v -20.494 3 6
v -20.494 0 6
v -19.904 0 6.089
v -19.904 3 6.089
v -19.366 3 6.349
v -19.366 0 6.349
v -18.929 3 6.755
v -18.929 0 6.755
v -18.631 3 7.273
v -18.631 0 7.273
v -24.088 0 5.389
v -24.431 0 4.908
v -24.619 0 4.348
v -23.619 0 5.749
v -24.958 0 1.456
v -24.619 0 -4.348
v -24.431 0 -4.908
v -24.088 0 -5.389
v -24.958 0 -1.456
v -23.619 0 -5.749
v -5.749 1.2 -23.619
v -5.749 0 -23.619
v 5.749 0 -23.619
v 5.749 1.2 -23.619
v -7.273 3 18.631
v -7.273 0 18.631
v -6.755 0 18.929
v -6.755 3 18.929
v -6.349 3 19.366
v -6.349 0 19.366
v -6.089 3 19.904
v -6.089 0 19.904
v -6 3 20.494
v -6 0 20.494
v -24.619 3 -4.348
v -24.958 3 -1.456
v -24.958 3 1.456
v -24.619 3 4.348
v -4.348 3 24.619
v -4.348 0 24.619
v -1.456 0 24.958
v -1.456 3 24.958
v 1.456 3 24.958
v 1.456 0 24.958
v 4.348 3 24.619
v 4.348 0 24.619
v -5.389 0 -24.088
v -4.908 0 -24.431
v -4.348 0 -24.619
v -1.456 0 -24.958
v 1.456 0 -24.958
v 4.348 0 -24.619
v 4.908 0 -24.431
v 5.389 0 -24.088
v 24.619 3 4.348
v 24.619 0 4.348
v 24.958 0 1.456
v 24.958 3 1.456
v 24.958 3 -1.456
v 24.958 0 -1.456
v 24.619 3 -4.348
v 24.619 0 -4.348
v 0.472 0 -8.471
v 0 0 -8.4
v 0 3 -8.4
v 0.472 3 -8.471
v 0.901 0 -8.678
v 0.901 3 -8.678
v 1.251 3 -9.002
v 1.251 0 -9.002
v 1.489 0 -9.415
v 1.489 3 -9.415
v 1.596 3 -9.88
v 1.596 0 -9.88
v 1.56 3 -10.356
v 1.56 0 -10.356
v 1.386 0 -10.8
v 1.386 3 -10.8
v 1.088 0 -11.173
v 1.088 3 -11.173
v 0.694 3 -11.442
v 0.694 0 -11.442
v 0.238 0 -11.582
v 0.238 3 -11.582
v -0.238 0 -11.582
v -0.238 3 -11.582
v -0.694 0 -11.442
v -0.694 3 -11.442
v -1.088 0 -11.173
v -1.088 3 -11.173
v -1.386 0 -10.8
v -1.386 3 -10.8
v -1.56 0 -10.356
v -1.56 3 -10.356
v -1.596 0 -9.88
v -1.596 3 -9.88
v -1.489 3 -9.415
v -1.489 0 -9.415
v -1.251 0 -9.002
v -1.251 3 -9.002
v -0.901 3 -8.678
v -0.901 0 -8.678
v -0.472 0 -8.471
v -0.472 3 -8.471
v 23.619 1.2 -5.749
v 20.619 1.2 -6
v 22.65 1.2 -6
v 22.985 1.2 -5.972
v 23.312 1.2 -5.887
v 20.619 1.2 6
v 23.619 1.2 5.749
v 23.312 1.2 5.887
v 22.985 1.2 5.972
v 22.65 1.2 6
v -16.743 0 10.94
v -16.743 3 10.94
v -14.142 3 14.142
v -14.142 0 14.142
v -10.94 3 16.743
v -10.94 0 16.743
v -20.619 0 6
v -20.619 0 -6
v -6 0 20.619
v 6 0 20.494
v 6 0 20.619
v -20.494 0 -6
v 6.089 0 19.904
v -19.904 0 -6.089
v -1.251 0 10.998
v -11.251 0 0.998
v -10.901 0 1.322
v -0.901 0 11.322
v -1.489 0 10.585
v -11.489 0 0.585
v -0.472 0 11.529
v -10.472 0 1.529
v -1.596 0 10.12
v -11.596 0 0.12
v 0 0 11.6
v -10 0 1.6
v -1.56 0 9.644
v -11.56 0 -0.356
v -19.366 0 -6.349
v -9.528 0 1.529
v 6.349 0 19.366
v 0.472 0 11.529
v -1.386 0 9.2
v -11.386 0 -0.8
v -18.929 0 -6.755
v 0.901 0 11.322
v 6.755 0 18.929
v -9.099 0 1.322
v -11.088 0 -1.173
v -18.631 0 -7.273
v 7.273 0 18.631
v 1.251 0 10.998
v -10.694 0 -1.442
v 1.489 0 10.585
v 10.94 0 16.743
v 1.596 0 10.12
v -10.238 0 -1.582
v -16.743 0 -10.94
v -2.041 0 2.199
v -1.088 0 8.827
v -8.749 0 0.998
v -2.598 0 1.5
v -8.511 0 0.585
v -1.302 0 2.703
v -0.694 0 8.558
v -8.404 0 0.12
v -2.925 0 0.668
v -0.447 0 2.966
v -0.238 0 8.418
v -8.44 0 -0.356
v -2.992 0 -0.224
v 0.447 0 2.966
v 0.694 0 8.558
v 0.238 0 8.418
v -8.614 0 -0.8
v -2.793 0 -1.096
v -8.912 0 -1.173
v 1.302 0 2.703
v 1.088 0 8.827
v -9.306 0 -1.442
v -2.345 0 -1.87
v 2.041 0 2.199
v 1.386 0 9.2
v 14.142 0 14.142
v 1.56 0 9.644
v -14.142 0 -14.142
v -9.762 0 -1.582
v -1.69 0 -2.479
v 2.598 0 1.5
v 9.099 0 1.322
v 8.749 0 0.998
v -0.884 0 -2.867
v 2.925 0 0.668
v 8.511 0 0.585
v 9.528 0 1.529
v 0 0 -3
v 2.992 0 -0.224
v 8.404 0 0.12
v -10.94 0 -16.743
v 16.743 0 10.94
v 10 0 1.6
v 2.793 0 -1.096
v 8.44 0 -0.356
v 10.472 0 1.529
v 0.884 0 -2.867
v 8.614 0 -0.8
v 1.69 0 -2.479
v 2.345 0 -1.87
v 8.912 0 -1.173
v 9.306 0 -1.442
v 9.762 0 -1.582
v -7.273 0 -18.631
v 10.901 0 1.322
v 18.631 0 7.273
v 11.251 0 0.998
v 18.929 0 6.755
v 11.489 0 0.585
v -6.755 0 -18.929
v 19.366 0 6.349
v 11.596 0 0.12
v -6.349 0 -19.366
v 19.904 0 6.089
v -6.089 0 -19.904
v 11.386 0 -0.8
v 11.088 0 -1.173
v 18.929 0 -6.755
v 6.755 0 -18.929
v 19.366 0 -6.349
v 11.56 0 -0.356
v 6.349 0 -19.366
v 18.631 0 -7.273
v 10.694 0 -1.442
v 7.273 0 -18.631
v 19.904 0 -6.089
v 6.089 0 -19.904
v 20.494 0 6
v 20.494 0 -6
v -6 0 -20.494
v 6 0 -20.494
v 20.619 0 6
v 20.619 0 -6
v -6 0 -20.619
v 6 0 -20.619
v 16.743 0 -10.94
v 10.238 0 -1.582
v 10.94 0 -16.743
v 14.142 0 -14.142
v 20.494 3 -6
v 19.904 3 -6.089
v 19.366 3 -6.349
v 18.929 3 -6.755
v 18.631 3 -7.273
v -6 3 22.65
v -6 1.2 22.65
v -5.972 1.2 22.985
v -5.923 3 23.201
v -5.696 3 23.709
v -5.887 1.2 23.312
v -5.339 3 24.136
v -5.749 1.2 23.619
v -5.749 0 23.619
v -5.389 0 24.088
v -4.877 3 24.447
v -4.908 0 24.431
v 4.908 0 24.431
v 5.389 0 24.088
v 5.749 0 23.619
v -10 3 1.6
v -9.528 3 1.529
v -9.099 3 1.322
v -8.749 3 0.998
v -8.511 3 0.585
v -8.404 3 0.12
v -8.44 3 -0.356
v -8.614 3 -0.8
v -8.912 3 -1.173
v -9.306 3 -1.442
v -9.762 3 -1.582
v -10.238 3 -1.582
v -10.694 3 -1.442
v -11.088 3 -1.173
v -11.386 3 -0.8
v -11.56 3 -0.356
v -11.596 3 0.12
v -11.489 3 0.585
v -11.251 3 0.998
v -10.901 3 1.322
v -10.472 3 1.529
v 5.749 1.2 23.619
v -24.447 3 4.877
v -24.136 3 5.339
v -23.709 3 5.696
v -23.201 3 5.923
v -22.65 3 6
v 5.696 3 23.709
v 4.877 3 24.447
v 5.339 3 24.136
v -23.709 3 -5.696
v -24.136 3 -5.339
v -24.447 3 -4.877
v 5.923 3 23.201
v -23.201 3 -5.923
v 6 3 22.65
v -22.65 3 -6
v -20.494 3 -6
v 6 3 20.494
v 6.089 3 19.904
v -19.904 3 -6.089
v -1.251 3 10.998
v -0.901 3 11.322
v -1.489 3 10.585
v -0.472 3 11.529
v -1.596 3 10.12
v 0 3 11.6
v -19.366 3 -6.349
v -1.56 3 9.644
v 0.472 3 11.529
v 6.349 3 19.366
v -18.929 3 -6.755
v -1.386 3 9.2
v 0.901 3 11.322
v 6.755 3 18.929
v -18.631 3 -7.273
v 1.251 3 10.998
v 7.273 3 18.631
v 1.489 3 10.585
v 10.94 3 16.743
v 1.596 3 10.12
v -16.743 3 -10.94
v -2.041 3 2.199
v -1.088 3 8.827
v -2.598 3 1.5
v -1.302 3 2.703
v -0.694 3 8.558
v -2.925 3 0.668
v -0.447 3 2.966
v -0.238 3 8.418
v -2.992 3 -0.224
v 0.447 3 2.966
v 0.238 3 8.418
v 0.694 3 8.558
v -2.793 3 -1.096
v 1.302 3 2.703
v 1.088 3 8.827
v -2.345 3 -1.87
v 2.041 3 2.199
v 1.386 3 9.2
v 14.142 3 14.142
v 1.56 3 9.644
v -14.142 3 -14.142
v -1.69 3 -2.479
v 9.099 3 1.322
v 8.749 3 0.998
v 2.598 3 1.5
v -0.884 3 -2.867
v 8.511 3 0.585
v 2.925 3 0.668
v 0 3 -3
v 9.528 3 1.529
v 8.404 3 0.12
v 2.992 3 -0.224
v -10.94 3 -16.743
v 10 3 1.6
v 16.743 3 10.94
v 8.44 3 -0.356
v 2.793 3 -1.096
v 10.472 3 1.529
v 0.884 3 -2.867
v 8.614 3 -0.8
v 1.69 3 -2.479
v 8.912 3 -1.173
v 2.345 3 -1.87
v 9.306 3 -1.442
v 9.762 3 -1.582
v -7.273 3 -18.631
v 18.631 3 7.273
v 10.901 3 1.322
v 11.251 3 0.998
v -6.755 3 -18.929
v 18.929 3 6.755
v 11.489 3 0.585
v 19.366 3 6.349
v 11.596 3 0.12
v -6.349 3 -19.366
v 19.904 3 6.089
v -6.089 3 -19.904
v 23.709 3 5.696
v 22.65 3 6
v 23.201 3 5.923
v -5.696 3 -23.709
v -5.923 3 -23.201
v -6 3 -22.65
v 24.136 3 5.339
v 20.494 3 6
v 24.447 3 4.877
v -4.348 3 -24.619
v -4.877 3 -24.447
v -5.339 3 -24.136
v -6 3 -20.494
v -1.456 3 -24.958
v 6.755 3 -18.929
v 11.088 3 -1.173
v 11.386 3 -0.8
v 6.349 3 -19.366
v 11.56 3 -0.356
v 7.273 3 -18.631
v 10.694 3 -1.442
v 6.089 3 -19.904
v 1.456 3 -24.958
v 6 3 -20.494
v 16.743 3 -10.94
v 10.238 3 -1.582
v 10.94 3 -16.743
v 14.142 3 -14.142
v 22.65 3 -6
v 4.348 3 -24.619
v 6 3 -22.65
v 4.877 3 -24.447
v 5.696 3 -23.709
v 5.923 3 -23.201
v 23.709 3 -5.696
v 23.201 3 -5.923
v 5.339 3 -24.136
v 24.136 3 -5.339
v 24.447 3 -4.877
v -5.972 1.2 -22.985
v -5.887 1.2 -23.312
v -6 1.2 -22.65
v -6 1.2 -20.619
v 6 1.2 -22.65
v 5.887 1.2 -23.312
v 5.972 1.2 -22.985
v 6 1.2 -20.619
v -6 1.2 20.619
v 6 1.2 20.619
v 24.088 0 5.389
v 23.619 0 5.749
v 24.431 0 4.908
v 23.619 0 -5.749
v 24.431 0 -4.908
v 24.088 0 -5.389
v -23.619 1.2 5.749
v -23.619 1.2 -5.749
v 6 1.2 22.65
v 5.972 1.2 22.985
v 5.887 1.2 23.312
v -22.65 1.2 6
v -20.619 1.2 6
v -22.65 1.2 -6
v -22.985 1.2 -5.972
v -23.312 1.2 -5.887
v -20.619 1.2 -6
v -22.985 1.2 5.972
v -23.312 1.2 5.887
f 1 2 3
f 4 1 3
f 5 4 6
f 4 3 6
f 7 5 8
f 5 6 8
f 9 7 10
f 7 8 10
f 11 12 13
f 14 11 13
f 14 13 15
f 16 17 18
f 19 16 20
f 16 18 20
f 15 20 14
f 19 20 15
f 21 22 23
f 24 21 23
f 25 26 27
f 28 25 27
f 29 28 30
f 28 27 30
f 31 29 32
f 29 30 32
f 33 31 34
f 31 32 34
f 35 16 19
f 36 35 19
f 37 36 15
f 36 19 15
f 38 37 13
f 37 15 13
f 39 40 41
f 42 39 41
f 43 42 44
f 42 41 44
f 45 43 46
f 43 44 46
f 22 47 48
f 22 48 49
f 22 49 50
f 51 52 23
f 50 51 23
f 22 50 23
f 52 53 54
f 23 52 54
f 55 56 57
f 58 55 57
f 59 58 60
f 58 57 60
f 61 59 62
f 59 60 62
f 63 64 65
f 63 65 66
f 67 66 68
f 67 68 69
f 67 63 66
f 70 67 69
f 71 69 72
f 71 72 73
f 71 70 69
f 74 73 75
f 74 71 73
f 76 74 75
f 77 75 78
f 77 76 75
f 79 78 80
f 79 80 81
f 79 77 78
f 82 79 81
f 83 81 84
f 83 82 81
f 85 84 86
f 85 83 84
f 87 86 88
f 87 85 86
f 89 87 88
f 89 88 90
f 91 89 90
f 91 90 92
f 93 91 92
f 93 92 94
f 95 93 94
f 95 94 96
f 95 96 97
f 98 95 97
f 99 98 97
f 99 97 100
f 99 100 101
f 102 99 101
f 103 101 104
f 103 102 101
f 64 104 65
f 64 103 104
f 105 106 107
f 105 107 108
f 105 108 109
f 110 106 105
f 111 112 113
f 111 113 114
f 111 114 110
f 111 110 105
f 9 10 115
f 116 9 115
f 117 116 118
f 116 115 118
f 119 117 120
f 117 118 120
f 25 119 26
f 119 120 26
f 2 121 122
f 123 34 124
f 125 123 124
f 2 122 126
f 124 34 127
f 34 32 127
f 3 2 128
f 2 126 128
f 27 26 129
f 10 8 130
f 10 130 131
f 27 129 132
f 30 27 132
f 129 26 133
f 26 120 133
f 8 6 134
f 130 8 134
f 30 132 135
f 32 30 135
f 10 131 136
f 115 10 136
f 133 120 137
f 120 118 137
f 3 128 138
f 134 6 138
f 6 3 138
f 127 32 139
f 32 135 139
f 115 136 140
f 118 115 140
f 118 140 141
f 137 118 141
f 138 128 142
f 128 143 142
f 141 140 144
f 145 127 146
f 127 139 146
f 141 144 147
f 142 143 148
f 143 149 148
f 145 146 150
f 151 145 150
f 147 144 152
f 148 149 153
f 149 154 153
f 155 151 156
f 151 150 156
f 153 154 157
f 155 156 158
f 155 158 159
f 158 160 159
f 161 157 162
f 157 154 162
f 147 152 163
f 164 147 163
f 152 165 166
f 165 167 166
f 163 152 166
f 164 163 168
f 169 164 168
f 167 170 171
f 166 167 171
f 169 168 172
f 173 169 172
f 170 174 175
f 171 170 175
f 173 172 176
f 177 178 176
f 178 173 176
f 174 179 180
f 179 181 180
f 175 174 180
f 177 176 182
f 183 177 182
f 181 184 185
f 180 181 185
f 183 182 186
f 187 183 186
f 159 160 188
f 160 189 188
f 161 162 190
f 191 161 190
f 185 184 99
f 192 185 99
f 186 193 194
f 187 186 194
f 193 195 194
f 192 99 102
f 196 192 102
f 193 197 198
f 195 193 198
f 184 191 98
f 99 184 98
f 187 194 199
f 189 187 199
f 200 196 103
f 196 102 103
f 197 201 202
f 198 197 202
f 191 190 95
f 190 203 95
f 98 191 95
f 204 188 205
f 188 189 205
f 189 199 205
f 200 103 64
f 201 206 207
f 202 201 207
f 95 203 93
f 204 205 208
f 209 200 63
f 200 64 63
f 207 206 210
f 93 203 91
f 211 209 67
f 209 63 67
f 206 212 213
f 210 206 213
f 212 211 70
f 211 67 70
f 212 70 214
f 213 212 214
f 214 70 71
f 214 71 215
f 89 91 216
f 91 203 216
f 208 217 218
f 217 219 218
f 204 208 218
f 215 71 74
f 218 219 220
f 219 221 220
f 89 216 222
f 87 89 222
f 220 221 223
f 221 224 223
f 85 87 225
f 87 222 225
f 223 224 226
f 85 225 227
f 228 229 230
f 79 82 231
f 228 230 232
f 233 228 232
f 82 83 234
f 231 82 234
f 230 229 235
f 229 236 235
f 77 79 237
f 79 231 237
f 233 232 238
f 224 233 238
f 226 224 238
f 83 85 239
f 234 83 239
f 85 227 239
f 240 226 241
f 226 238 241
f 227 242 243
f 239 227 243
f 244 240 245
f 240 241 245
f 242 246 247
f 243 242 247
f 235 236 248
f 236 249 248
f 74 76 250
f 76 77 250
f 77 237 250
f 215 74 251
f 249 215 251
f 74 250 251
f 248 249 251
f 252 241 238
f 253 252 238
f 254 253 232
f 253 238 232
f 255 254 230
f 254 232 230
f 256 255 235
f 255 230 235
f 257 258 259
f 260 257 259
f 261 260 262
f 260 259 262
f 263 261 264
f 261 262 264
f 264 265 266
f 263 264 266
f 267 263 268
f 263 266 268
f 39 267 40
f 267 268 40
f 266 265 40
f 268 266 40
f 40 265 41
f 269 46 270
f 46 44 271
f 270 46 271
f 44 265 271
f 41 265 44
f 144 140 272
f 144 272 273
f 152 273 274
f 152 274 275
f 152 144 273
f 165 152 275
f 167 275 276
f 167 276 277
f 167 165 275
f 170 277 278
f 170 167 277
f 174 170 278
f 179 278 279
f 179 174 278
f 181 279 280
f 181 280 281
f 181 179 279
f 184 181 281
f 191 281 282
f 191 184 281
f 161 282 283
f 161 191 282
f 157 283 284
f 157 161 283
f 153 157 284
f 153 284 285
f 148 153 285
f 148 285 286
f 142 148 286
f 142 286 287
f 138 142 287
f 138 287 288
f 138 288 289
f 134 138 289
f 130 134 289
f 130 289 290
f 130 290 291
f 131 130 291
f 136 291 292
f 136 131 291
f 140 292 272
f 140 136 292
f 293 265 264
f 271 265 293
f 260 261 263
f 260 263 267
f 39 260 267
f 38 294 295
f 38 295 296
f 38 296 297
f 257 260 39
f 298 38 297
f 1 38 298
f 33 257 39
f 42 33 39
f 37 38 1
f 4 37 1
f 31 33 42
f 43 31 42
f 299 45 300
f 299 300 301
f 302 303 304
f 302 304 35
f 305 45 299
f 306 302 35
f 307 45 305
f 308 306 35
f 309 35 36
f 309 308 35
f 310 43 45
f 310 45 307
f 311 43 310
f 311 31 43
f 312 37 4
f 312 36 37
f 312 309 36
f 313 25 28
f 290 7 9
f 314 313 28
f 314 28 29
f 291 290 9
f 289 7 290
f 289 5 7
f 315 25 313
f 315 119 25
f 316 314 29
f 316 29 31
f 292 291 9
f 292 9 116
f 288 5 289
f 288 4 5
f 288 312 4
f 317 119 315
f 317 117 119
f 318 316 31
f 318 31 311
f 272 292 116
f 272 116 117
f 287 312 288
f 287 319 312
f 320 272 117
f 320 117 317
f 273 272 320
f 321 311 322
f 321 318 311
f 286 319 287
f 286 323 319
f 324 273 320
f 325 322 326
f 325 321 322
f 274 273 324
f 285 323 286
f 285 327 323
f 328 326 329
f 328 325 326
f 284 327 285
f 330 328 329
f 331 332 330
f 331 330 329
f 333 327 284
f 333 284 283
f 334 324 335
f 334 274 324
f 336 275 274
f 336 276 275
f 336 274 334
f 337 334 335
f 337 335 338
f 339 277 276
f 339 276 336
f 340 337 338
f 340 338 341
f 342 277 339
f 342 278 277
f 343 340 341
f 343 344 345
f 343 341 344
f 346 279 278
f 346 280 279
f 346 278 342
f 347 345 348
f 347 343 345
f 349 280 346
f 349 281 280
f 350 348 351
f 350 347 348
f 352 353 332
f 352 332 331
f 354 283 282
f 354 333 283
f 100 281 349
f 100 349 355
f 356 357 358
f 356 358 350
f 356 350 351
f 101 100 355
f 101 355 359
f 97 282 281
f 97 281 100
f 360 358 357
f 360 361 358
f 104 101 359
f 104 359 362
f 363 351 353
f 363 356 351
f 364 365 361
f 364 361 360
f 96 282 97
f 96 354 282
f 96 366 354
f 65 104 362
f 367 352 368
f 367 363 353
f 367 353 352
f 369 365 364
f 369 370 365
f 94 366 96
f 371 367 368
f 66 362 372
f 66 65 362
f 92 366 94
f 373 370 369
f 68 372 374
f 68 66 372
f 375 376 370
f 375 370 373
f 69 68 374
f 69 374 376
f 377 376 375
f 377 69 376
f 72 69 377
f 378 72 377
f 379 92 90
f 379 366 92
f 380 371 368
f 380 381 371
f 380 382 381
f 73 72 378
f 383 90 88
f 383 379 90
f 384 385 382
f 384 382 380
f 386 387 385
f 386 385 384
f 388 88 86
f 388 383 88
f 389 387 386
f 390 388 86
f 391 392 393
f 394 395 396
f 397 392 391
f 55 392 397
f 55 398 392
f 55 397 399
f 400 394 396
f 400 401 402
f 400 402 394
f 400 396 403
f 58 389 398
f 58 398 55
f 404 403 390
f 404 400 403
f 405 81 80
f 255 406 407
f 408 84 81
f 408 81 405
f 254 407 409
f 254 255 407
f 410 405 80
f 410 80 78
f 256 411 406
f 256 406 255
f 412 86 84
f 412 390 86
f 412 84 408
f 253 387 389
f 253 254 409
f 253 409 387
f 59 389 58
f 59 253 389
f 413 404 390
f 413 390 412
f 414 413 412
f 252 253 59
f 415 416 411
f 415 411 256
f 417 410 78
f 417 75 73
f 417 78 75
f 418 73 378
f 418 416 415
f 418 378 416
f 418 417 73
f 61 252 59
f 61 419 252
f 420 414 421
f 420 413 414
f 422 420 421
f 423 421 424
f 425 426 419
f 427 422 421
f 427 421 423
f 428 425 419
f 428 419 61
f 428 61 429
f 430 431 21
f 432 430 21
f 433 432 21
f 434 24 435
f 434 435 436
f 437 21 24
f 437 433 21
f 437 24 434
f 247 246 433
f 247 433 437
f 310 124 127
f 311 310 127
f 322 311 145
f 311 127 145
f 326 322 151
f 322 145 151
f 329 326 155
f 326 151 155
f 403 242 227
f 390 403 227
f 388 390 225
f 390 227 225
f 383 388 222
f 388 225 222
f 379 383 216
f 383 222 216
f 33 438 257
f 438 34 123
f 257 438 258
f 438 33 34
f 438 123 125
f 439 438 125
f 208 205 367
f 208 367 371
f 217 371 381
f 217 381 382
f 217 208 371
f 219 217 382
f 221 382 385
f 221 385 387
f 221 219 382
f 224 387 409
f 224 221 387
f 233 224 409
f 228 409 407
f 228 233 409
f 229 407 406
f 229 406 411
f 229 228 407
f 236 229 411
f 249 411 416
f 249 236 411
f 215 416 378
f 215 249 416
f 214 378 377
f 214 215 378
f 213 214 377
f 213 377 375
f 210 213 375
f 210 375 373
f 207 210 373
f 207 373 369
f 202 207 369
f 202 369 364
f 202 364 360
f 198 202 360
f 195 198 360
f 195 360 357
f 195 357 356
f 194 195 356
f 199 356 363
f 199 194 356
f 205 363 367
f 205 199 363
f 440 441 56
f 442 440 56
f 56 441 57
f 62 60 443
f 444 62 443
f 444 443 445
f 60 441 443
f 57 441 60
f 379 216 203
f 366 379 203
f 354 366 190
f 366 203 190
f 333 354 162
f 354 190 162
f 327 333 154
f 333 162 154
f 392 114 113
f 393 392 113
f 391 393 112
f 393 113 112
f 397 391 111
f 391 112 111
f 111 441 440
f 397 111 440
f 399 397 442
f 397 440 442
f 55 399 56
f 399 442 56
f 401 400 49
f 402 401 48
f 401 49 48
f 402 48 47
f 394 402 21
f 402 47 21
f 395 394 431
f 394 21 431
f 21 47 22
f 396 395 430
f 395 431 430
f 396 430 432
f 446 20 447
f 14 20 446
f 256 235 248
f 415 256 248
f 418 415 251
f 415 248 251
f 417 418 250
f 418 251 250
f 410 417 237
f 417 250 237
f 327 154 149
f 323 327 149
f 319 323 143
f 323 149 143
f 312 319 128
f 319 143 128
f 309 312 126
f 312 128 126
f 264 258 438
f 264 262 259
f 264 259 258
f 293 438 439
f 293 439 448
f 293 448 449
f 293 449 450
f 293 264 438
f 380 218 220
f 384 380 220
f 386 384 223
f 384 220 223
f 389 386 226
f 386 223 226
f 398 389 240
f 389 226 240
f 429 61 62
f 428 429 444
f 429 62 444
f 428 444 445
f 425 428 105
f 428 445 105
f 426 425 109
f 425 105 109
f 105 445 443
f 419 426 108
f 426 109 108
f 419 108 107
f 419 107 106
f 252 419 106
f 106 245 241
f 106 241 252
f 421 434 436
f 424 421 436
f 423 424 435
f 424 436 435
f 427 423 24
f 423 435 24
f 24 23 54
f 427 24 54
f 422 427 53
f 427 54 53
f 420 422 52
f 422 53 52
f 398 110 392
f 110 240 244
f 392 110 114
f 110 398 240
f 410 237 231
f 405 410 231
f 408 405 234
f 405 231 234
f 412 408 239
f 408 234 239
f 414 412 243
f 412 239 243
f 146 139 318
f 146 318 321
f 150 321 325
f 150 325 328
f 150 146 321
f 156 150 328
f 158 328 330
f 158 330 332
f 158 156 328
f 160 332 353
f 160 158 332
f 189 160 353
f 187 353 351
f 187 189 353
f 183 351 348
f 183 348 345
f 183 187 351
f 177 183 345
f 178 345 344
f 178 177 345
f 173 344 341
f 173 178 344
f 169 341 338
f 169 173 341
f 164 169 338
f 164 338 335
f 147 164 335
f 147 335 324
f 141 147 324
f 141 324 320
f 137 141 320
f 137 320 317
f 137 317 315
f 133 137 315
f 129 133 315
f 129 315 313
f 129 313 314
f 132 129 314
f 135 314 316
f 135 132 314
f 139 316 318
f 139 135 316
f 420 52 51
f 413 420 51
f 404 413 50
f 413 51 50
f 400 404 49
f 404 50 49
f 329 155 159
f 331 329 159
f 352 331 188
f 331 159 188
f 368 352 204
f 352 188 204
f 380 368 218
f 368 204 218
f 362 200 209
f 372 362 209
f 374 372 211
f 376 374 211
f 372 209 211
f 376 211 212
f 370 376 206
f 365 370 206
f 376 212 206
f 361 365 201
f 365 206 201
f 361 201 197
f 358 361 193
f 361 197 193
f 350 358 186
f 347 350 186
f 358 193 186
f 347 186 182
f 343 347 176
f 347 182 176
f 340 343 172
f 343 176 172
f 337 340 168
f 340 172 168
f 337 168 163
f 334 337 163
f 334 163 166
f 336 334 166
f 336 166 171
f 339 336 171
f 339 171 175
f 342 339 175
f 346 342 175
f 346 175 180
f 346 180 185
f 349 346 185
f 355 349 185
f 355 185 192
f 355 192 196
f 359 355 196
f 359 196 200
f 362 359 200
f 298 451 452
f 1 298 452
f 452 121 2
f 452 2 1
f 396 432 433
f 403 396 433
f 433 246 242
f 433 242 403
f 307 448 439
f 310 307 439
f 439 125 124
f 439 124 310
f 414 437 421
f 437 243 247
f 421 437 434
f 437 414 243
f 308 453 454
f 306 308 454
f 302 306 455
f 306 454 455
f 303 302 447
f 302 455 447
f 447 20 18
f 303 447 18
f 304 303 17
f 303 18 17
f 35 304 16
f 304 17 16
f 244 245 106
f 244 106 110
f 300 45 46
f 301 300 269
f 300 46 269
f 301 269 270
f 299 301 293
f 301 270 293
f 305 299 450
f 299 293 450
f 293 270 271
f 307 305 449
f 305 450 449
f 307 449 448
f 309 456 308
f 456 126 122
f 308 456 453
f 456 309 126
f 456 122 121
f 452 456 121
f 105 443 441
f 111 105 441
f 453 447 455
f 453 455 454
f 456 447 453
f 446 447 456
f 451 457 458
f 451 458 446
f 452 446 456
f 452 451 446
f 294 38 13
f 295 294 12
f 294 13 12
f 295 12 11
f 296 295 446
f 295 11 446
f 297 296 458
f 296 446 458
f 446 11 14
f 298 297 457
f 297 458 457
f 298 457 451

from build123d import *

# Parameters (mm, degrees)
SKIZZE1_R                       = 19
SKIZZE1_R_2                     = 1.6
AUFSATZ_LINEAR_AUSTRAGEN1_DEPTH = 3
SKIZZE6_R                       = 3
SCHNITT_LINEAR_AUSTRAGEN2_DEPTH = 36.482389998
SKIZZE7_W                       = 3
SKIZZE7_H                       = 12
SKIZZE7_W_2                     = 12
SKIZZE7_H_2                     = 3
SCHNITT_LINEAR_AUSTRAGEN3_DEPTH = 1.2


with BuildPart() as part:
    # Skizze1 → Aufsatz-Linear austragen1 (new body)
    with BuildSketch(Plane(origin=(0, 0, 0), x_dir=(1, 0, 0), z_dir=(0, 1, 0))):
        with BuildLine():
            ThreePointArc((6, -20.493901532), (6.348554352, -19.365749382), (7.272727273, -18.630819574))
            ThreePointArc((7.272727273, -18.630819574), (14.142135624, -14.142135624), (18.630819574, -7.272727273))
            ThreePointArc((18.630819574, -7.272727273), (19.365749382, -6.348554352), (20.493901532, -6))
            Line((20.493901532, -6), (22.649503306, -6))
            ThreePointArc((22.649503306, -6), (23.93487248, -5.532261755), (24.619025332, -4.347826087))
            ThreePointArc((24.619025332, -4.347826087), (25, 0), (24.619025332, 4.347826087))
            ThreePointArc((24.619025332, 4.347826087), (23.93487248, 5.532261755), (22.649503306, 6))
            Line((22.649503306, 6), (20.493901532, 6))
            ThreePointArc((20.493901532, 6), (19.365749382, 6.348554352), (18.630819574, 7.272727273))
            ThreePointArc((18.630819574, 7.272727273), (14.142135624, 14.142135624), (7.272727273, 18.630819574))
            ThreePointArc((7.272727273, 18.630819574), (6.348554352, 19.365749382), (6, 20.493901532))
            Line((6, 20.493901532), (6, 22.649503306))
            ThreePointArc((6, 22.649503306), (5.532261755, 23.93487248), (4.347826087, 24.619025332))
            ThreePointArc((4.347826087, 24.619025332), (0, 25), (-4.347826087, 24.619025332))
            ThreePointArc((-4.347826087, 24.619025332), (-5.532261755, 23.93487248), (-6, 22.649503306))
            Line((-6, 22.649503306), (-6, 20.493901532))
            ThreePointArc((-6, 20.493901532), (-6.348554352, 19.365749382), (-7.272727273, 18.630819574))
            ThreePointArc((-7.272727273, 18.630819574), (-14.142135624, 14.142135624), (-18.630819574, 7.272727273))
            ThreePointArc((-18.630819574, 7.272727273), (-19.365749382, 6.348554352), (-20.493901532, 6))
            Line((-20.493901532, 6), (-22.649503306, 6))
            ThreePointArc((-22.649503306, 6), (-23.93487248, 5.532261755), (-24.619025332, 4.347826087))
            ThreePointArc((-24.619025332, 4.347826087), (-25, 0), (-24.619025332, -4.347826087))
            ThreePointArc((-24.619025332, -4.347826087), (-23.93487248, -5.532261755), (-22.649503306, -6))
            Line((-22.649503306, -6), (-20.493901532, -6))
            ThreePointArc((-20.493901532, -6), (-19.365749382, -6.348554352), (-18.630819574, -7.272727273))
            ThreePointArc((-18.630819574, -7.272727273), (-14.142135624, -14.142135624), (-7.272727273, -18.630819574))
            ThreePointArc((-7.272727273, -18.630819574), (-6.348554352, -19.365749382), (-6, -20.493901532))
            Line((-6, -20.493901532), (-6, -22.649503306))
            ThreePointArc((-6, -22.649503306), (-5.532261755, -23.93487248), (-4.347826087, -24.619025332))
            ThreePointArc((-4.347826087, -24.619025332), (0, -25), (4.347826087, -24.619025332))
            ThreePointArc((4.347826087, -24.619025332), (5.532261755, -23.93487248), (6, -22.649503306))
            Line((6, -22.649503306), (6, -20.493901532))
        make_face()
        Circle(SKIZZE1_R, mode=Mode.SUBTRACT)
        Circle(SKIZZE1_R)
        with Locations(Location((0, -10, 0), (0, 0, 270))):
            Circle(SKIZZE1_R_2, mode=Mode.SUBTRACT)
        with Locations(Location((-10, 0, 0), (0, 0, 270))):
            Circle(SKIZZE1_R_2, mode=Mode.SUBTRACT)
        with Locations(Location((10, 0, 0), (0, 0, 270))):
            Circle(SKIZZE1_R_2, mode=Mode.SUBTRACT)
        with Locations(Location((0, 10, 0), (0, 0, 270))):
            Circle(SKIZZE1_R_2, mode=Mode.SUBTRACT)
        with Locations(Location((0, 0, 0), (0, 0, 270))):
            Circle(SKIZZE1_R_2, mode=Mode.SUBTRACT)
    extrude(amount=AUFSATZ_LINEAR_AUSTRAGEN1_DEPTH)

    # Skizze6 → Schnitt-Linear austragen2 (cut, through all)
    with BuildSketch(Plane.XZ):
        with Locations(Location((0, 0, 0), (0, 0, 270))):
            Circle(SKIZZE6_R)
    extrude(amount=-SCHNITT_LINEAR_AUSTRAGEN2_DEPTH, mode=Mode.SUBTRACT)

    # Skizze7 → Schnitt-Linear austragen3 (cut)
    with BuildSketch(Plane.XZ):
        with Locations((-22.119025332, 0)):
            Rectangle(SKIZZE7_W, SKIZZE7_H)
        with Locations((0, 22.119025332)):
            Rectangle(SKIZZE7_W_2, SKIZZE7_H_2)
        with Locations((22.119025332, 0)):
            Rectangle(SKIZZE7_W, SKIZZE7_H)
        with Locations((0, -22.119025332)):
            Rectangle(SKIZZE7_W_2, SKIZZE7_H_2)
    extrude(amount=-SCHNITT_LINEAR_AUSTRAGEN3_DEPTH, mode=Mode.SUBTRACT)


solid = part.part
